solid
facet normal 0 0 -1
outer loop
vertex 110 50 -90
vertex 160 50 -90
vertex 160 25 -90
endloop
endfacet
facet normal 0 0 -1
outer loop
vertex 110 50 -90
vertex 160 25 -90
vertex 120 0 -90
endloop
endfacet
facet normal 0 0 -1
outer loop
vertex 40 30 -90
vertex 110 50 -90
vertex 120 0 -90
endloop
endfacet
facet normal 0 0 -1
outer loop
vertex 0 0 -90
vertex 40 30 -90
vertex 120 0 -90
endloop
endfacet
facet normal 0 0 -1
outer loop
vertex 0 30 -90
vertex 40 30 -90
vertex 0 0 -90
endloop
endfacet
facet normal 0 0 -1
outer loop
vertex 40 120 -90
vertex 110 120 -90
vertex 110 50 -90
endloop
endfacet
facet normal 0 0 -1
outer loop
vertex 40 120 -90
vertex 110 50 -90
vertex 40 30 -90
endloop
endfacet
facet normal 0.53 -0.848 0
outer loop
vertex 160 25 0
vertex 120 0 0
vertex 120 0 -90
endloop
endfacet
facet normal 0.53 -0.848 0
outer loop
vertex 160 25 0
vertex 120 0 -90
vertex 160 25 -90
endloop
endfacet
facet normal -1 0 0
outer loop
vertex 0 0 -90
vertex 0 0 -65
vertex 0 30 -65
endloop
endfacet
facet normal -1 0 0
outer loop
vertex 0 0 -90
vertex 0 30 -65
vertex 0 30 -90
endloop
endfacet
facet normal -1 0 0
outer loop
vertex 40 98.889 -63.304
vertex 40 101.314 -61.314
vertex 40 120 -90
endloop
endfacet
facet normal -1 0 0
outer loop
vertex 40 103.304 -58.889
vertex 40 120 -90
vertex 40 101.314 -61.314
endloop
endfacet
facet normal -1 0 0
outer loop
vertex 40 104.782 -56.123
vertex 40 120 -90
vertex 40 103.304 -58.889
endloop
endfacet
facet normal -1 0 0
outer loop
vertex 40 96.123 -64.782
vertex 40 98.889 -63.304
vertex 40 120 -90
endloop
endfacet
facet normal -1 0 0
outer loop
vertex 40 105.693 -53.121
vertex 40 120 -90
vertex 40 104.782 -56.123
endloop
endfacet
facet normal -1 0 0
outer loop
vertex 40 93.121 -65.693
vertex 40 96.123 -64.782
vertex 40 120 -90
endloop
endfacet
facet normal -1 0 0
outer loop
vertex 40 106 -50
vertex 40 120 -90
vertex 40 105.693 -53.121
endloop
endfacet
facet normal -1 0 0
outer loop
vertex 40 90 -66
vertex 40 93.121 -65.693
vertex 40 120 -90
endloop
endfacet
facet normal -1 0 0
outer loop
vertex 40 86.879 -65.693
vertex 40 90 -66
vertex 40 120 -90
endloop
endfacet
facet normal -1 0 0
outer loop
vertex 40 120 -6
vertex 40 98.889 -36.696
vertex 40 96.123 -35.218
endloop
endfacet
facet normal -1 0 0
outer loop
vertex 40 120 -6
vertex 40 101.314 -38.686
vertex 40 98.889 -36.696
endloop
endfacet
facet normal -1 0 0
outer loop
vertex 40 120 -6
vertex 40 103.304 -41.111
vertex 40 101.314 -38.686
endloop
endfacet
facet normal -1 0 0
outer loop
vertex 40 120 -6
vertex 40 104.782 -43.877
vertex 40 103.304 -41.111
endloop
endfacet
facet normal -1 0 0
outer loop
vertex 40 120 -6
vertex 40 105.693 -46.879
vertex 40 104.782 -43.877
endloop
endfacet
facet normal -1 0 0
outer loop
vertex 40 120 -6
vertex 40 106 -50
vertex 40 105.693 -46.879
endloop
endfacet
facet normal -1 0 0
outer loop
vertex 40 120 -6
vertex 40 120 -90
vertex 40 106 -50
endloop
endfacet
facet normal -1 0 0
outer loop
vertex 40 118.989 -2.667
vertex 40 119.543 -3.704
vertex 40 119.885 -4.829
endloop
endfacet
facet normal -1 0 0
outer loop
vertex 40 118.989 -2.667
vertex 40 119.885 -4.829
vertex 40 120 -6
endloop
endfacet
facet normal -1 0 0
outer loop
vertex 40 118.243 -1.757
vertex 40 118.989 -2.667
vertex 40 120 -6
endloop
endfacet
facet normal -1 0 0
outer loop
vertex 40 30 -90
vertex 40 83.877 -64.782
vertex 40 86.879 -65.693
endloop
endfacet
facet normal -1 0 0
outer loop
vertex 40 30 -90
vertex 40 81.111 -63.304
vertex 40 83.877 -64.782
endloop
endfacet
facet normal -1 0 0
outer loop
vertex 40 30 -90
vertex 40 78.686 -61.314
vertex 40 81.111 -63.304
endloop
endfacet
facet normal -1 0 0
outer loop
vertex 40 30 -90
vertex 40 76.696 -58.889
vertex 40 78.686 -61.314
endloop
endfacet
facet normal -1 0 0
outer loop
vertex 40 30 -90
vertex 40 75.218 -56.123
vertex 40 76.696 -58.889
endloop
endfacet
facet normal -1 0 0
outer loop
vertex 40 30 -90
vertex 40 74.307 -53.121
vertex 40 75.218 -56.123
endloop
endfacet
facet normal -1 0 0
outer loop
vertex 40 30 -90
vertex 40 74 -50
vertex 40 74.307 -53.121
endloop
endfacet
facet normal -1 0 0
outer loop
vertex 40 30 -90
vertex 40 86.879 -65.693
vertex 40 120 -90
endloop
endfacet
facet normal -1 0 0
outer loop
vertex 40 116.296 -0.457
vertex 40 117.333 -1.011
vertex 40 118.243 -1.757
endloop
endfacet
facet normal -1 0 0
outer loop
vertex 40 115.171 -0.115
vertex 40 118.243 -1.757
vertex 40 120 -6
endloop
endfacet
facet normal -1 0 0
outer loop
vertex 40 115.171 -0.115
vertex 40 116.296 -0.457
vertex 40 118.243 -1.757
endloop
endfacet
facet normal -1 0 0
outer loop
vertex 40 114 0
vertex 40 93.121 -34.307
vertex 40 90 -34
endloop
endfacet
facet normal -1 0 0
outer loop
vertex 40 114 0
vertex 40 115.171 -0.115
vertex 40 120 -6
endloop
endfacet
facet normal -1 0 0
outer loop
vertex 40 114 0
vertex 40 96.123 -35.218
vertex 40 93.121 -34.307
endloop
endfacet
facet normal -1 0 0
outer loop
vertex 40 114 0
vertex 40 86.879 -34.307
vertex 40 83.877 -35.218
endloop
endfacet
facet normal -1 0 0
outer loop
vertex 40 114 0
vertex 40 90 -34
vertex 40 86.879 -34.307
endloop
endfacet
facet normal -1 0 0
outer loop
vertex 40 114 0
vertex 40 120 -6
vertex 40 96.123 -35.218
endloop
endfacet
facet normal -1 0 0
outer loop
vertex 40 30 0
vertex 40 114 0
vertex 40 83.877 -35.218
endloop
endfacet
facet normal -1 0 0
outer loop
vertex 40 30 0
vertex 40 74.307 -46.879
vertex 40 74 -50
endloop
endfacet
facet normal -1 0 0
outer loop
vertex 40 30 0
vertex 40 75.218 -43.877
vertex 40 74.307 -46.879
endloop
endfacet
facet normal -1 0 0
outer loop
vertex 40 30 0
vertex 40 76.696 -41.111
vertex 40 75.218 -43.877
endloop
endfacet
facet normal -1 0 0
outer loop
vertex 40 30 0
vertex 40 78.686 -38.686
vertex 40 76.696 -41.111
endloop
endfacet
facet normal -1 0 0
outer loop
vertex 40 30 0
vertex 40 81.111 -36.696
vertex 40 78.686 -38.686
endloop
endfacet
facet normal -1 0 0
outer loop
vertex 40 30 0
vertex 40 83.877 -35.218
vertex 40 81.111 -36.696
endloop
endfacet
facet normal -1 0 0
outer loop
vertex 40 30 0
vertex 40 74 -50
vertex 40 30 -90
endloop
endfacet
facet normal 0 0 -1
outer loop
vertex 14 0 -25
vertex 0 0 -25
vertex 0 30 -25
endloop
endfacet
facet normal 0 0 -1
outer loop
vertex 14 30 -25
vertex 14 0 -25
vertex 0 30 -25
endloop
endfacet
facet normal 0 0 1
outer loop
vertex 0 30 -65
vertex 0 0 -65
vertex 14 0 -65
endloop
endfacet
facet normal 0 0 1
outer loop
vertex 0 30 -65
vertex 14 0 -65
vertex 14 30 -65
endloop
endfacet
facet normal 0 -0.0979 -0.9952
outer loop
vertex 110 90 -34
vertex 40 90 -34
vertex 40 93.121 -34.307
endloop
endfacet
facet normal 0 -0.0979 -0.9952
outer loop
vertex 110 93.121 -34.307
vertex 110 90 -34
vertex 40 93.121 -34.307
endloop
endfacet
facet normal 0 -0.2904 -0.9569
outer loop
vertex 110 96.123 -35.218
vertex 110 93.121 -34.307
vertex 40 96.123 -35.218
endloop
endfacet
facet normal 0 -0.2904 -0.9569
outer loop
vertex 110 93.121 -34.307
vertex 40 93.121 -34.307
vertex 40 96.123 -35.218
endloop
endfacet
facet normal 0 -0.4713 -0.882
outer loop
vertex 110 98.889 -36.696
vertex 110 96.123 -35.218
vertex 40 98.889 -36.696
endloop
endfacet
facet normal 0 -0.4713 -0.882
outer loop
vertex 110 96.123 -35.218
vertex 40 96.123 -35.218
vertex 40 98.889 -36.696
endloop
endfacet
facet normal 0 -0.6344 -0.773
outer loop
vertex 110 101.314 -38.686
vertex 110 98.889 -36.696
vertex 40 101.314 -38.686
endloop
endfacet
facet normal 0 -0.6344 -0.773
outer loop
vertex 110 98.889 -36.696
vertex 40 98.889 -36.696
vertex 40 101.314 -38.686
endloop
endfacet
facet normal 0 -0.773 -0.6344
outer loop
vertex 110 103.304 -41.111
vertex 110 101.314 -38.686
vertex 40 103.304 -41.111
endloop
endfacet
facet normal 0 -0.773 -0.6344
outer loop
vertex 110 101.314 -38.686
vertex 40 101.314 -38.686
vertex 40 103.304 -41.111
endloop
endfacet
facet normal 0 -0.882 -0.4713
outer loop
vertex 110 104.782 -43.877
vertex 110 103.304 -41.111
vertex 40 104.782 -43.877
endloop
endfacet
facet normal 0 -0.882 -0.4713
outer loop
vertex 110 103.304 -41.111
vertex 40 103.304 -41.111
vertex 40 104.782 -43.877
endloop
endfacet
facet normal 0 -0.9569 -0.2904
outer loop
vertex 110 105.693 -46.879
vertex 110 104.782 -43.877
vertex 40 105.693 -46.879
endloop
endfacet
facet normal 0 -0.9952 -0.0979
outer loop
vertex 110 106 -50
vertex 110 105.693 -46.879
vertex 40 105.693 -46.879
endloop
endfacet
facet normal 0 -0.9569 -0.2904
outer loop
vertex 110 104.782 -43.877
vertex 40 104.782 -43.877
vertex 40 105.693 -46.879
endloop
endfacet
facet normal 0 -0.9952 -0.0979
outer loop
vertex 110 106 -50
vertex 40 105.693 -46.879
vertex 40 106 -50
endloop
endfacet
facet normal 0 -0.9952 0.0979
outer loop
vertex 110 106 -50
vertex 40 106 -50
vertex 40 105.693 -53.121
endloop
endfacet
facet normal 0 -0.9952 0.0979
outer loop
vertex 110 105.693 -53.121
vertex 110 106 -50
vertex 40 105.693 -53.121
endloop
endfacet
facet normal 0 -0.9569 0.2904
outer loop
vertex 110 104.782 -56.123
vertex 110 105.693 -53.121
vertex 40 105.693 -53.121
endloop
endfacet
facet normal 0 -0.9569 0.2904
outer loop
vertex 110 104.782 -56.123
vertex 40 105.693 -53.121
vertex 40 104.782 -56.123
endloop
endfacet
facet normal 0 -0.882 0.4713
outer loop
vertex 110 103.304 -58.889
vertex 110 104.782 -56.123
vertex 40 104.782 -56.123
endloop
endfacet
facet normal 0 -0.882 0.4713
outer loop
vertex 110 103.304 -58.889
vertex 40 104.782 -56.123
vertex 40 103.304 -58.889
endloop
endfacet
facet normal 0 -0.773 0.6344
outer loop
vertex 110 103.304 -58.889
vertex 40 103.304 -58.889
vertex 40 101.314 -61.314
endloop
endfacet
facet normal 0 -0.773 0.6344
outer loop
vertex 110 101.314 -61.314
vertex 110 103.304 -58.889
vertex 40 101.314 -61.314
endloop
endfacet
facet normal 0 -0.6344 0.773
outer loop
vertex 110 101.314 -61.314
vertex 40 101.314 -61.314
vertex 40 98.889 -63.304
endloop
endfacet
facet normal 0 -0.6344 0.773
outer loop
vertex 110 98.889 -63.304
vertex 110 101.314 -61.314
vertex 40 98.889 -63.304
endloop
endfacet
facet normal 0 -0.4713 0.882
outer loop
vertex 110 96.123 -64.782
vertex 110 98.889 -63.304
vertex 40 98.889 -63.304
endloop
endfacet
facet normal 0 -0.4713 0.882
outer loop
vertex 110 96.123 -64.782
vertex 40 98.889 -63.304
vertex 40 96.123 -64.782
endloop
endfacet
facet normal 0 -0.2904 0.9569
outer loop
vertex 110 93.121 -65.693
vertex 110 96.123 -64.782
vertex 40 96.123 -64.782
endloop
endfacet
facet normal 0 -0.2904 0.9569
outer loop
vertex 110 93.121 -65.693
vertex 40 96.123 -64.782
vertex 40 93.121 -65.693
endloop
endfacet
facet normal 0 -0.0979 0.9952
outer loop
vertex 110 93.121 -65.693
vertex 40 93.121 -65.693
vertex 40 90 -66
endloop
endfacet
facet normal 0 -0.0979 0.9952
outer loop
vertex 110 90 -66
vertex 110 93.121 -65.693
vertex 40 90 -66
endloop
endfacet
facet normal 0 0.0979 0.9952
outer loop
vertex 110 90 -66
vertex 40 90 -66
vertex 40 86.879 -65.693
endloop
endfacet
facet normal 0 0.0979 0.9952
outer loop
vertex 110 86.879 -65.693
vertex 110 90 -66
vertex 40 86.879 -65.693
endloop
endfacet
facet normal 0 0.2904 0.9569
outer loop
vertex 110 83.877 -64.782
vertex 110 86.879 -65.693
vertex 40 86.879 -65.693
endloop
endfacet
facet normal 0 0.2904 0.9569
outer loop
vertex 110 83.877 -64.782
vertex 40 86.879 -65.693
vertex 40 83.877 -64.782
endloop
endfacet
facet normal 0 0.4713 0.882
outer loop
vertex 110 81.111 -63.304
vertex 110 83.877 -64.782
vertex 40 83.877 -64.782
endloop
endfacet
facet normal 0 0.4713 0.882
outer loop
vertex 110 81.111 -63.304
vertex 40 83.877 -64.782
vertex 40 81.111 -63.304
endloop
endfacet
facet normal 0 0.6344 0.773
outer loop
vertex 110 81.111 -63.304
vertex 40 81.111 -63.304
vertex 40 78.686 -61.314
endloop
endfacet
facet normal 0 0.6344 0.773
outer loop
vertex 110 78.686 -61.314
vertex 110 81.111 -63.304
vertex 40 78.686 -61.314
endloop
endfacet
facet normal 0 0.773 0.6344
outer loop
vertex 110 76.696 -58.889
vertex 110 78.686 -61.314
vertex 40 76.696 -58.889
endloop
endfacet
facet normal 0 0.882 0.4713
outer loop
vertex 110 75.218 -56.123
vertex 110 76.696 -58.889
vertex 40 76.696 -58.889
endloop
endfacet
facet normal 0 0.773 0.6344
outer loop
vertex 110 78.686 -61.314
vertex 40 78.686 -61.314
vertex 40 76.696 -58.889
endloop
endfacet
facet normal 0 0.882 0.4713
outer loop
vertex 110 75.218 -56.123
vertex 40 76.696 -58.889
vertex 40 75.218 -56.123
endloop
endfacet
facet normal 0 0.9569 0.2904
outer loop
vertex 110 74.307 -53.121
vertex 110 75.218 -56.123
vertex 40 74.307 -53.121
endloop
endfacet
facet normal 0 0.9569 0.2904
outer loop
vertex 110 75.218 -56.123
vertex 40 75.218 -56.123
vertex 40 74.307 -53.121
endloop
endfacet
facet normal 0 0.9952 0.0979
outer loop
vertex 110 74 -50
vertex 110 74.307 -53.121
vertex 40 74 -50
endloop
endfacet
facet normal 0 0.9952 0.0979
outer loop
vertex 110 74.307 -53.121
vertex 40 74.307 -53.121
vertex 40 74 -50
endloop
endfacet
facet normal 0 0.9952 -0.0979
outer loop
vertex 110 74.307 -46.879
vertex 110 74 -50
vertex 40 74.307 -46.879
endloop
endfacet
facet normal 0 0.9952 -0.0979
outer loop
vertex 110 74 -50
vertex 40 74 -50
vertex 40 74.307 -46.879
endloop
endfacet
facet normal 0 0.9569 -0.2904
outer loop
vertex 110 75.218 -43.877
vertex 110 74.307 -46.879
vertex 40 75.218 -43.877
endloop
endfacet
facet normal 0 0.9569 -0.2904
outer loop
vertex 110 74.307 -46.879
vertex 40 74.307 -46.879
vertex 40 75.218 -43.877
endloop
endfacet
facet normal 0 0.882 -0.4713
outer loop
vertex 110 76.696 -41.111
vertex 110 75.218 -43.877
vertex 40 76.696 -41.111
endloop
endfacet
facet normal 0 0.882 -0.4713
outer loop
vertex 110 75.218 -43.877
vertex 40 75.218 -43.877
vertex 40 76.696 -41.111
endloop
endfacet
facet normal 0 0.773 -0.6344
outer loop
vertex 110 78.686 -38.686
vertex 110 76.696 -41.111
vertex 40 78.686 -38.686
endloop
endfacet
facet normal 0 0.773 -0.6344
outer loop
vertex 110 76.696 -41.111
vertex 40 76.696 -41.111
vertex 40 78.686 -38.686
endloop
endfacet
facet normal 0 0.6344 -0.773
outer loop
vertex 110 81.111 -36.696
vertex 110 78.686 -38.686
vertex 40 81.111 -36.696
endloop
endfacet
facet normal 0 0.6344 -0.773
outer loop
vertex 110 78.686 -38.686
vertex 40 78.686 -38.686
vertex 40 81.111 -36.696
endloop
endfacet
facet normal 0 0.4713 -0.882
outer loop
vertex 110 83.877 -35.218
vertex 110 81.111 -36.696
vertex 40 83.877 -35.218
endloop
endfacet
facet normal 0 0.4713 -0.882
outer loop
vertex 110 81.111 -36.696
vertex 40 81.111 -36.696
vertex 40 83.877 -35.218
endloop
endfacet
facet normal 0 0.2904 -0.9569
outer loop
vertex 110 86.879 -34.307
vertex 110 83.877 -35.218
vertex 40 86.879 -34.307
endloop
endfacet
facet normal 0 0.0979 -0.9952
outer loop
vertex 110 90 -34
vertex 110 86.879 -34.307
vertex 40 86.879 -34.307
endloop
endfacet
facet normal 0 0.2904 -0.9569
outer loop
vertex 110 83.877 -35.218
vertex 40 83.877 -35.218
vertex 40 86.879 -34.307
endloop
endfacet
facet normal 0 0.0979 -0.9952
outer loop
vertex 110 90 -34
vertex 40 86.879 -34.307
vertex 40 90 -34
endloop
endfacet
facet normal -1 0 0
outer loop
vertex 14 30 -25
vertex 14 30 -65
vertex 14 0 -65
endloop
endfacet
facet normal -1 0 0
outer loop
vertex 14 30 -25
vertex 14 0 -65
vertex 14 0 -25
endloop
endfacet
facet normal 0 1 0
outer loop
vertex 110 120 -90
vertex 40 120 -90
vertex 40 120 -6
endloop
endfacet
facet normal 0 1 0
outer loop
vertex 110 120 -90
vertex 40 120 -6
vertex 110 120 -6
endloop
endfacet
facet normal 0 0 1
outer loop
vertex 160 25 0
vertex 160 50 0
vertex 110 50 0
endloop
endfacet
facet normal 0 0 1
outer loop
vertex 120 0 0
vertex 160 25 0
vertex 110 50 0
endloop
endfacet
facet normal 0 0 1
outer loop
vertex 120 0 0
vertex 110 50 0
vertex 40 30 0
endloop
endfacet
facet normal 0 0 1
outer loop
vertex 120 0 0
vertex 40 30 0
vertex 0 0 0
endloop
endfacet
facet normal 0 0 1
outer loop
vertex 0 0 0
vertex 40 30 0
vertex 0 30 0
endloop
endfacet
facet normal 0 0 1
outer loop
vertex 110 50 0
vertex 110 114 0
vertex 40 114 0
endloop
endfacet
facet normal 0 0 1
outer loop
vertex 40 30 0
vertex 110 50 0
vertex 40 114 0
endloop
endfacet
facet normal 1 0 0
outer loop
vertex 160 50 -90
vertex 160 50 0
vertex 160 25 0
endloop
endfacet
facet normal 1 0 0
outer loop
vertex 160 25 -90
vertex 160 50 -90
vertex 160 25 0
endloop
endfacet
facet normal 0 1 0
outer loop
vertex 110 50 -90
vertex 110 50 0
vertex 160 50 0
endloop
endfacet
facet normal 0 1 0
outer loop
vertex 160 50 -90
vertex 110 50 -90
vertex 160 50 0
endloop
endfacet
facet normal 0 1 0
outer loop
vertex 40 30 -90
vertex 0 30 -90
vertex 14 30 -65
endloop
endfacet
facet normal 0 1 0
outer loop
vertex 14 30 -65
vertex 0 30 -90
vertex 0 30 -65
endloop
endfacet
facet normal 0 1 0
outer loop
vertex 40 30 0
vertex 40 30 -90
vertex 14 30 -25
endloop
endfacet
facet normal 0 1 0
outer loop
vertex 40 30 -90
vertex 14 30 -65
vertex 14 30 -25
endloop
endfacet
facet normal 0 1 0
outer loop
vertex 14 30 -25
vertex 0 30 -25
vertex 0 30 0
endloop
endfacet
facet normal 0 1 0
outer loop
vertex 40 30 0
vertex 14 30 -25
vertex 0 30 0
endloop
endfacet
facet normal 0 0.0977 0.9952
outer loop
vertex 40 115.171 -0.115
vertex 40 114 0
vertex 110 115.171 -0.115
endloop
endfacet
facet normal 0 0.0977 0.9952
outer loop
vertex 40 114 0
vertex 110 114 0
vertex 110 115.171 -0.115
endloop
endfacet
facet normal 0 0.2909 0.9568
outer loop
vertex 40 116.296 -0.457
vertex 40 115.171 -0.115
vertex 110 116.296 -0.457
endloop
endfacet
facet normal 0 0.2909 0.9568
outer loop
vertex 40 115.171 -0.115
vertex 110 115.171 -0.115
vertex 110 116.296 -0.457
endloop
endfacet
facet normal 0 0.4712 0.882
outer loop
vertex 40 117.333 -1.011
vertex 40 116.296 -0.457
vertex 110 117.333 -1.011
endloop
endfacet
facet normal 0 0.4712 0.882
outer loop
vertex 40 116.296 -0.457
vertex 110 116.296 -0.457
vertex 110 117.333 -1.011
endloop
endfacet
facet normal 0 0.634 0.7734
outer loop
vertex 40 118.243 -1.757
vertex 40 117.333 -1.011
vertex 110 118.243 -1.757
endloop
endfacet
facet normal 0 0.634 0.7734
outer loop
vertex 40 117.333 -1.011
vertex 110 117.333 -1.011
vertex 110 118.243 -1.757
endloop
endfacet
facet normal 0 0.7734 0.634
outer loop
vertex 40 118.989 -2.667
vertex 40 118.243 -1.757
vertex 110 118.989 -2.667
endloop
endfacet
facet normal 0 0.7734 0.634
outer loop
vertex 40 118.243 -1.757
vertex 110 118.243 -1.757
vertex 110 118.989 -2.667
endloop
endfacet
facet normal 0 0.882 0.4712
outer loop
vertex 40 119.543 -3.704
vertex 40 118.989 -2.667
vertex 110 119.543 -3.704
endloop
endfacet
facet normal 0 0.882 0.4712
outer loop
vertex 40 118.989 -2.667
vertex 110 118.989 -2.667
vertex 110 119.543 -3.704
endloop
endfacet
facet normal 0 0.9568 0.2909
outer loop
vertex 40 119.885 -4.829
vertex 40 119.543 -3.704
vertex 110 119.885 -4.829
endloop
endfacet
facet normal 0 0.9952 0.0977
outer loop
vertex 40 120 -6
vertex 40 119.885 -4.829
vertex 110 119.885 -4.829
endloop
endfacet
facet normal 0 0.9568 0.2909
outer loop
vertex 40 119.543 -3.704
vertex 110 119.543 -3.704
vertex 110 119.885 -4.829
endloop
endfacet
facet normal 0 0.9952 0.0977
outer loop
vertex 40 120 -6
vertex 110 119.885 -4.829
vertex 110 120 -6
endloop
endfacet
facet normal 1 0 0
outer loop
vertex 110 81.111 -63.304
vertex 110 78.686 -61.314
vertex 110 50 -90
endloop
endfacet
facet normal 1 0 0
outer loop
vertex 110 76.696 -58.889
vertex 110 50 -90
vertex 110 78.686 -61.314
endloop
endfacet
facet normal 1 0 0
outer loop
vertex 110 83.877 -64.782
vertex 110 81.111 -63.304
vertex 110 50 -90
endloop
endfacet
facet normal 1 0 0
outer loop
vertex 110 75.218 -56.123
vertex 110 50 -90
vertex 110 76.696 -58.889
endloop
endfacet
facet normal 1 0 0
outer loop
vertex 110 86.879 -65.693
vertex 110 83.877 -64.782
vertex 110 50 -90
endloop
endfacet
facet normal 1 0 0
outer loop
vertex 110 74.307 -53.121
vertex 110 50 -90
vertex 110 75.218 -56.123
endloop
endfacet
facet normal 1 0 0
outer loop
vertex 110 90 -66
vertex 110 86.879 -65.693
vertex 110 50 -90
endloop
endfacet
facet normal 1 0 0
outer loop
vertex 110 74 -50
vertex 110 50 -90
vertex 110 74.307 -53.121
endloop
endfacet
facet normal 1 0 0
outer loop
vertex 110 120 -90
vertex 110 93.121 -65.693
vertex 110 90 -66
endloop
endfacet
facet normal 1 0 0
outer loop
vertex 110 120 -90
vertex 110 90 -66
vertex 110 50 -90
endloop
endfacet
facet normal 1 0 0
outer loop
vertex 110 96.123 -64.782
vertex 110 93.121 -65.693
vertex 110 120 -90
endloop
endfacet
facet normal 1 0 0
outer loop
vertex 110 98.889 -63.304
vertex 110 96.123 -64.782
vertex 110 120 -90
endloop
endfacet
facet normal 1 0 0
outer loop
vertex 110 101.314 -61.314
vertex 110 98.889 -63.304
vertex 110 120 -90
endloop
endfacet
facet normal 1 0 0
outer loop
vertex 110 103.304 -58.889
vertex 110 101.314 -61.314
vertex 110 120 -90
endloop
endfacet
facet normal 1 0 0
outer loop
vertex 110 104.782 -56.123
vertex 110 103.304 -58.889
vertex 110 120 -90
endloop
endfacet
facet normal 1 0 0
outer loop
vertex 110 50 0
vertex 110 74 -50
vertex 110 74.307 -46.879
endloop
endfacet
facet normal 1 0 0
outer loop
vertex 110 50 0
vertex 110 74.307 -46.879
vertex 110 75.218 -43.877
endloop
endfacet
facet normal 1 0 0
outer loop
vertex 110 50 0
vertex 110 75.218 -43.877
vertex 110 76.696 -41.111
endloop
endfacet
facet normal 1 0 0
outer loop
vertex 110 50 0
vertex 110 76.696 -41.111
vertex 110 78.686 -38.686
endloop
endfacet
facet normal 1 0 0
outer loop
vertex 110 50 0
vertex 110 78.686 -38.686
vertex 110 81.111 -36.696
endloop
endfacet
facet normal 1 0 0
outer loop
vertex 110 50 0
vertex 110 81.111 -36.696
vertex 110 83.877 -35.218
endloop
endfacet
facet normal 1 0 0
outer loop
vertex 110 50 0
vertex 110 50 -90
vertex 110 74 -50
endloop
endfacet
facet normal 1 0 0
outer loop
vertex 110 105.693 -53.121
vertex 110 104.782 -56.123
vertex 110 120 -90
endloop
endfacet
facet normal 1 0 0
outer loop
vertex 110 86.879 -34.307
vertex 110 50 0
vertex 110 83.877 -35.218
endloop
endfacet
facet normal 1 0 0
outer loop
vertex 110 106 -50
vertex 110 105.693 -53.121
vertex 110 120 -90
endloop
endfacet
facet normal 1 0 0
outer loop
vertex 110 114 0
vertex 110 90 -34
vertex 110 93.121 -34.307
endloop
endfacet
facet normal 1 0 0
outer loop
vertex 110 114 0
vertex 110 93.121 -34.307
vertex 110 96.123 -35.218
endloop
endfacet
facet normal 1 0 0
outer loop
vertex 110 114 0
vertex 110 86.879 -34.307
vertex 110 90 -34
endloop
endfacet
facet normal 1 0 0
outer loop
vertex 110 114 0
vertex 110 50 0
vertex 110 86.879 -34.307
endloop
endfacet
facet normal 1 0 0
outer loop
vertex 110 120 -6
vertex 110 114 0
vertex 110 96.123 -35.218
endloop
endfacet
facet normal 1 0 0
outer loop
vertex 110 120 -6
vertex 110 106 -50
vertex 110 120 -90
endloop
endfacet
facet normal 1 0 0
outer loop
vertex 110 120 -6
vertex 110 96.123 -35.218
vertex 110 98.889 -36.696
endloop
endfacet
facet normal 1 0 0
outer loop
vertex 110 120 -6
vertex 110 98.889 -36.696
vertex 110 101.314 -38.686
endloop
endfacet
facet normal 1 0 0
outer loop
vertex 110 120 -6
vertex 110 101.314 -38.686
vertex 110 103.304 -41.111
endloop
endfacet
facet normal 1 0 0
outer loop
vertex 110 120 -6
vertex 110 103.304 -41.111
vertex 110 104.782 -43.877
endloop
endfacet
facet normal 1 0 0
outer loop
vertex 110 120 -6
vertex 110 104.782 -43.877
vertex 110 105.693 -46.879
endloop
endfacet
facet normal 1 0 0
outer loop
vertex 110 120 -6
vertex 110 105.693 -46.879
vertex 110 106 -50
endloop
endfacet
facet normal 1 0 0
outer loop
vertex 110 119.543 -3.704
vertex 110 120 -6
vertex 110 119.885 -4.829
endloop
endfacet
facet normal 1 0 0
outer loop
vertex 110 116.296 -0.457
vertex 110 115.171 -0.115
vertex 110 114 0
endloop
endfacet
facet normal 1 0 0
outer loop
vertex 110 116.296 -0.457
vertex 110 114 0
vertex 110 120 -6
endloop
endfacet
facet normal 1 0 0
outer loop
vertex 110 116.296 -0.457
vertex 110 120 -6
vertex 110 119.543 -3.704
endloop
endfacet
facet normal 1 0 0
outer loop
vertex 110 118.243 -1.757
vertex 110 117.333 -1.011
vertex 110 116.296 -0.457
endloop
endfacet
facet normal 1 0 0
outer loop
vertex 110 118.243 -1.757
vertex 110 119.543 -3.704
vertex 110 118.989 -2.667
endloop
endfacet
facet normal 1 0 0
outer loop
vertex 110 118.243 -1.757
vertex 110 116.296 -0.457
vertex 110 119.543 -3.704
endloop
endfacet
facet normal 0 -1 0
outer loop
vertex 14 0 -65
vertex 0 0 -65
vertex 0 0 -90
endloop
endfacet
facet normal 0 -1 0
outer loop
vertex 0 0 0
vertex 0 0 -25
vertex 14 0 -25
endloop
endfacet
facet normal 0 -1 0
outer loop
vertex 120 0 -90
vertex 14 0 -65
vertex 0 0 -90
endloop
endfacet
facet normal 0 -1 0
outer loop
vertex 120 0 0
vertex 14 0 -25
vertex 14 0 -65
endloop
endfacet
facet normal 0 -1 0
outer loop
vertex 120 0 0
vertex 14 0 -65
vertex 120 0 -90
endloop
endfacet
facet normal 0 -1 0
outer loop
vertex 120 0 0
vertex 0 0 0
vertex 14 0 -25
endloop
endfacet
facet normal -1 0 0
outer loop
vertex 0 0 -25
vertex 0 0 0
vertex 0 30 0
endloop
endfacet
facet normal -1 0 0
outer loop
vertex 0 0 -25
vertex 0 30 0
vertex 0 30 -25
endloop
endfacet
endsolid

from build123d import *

# Parameters (mm, degrees)
ESBO_O1_W                = 25
ESBO_O1_H                = 30
ESBO_O1_W_2              = 40
RESSALTO_EXTRUS_O2_DEPTH = 40
RESSALTO_EXTRUS_O3_DEPTH = 90
ESBO_O3_R                = 16
CORTE_EXTRUS_O1_DEPTH    = 193.093727123
FILETE1_R                = 6
ESBO_O4_W                = 40
ESBO_O4_H                = 30
CORTE_EXTRUS_O2_DEPTH    = 14
CORTE_EXTRUS_O3_DEPTH    = 220.317121995


with BuildPart() as part:
    # Esboço1 → Ressalto-extrusão2 (new body)
    with BuildSketch(Plane(origin=(0, 0, 0), x_dir=(0, 0, -1), z_dir=(1, 0, 0))):
        with Locations((12.5, 15)):
            Rectangle(ESBO_O1_W, ESBO_O1_H)
        with Locations((77.5, 15)):
            Rectangle(ESBO_O1_W, ESBO_O1_H)
        with Locations((45, 15)):
            Rectangle(ESBO_O1_W_2, ESBO_O1_H)
    extrude(amount=RESSALTO_EXTRUS_O2_DEPTH)

    # Esboço2 → Ressalto-extrusão3 (add)
    with BuildSketch(Plane.XY):
        Polygon((40, 30), (40, 120), (110, 120), (110, 104.242681345), (110, 50), (160, 50), (160, 0), (120, 0), (40, 0), align=None)
    extrude(amount=-RESSALTO_EXTRUS_O3_DEPTH)

    # Esboço3 → Corte-extrusão1 (cut, through all)
    with BuildSketch(Plane.ZY.offset(-40)):
        with Locations((-50, 90)):
            Circle(ESBO_O3_R)
    extrude(amount=-CORTE_EXTRUS_O1_DEPTH, mode=Mode.SUBTRACT)

    # Filete1
    filete1_edges = [part.edges().sort_by_distance(p)[0] for p in [
        (75, 120, 0),
    ]]
    fillet(filete1_edges, radius=FILETE1_R)

    # Esboço4 → Corte-extrusão2 (cut)
    with BuildSketch(Plane.ZY):
        with Locations((-45, 15)):
            Rectangle(ESBO_O4_W, ESBO_O4_H)
    extrude(amount=-CORTE_EXTRUS_O2_DEPTH, mode=Mode.SUBTRACT)

    # Esboço5 → Corte-extrusão3 (cut, through all)
    with BuildSketch(Plane.XY):
        Polygon((120, 0), (160, 25), (160, 0), align=None)
    extrude(amount=-CORTE_EXTRUS_O3_DEPTH, mode=Mode.SUBTRACT)


solid = part.part
